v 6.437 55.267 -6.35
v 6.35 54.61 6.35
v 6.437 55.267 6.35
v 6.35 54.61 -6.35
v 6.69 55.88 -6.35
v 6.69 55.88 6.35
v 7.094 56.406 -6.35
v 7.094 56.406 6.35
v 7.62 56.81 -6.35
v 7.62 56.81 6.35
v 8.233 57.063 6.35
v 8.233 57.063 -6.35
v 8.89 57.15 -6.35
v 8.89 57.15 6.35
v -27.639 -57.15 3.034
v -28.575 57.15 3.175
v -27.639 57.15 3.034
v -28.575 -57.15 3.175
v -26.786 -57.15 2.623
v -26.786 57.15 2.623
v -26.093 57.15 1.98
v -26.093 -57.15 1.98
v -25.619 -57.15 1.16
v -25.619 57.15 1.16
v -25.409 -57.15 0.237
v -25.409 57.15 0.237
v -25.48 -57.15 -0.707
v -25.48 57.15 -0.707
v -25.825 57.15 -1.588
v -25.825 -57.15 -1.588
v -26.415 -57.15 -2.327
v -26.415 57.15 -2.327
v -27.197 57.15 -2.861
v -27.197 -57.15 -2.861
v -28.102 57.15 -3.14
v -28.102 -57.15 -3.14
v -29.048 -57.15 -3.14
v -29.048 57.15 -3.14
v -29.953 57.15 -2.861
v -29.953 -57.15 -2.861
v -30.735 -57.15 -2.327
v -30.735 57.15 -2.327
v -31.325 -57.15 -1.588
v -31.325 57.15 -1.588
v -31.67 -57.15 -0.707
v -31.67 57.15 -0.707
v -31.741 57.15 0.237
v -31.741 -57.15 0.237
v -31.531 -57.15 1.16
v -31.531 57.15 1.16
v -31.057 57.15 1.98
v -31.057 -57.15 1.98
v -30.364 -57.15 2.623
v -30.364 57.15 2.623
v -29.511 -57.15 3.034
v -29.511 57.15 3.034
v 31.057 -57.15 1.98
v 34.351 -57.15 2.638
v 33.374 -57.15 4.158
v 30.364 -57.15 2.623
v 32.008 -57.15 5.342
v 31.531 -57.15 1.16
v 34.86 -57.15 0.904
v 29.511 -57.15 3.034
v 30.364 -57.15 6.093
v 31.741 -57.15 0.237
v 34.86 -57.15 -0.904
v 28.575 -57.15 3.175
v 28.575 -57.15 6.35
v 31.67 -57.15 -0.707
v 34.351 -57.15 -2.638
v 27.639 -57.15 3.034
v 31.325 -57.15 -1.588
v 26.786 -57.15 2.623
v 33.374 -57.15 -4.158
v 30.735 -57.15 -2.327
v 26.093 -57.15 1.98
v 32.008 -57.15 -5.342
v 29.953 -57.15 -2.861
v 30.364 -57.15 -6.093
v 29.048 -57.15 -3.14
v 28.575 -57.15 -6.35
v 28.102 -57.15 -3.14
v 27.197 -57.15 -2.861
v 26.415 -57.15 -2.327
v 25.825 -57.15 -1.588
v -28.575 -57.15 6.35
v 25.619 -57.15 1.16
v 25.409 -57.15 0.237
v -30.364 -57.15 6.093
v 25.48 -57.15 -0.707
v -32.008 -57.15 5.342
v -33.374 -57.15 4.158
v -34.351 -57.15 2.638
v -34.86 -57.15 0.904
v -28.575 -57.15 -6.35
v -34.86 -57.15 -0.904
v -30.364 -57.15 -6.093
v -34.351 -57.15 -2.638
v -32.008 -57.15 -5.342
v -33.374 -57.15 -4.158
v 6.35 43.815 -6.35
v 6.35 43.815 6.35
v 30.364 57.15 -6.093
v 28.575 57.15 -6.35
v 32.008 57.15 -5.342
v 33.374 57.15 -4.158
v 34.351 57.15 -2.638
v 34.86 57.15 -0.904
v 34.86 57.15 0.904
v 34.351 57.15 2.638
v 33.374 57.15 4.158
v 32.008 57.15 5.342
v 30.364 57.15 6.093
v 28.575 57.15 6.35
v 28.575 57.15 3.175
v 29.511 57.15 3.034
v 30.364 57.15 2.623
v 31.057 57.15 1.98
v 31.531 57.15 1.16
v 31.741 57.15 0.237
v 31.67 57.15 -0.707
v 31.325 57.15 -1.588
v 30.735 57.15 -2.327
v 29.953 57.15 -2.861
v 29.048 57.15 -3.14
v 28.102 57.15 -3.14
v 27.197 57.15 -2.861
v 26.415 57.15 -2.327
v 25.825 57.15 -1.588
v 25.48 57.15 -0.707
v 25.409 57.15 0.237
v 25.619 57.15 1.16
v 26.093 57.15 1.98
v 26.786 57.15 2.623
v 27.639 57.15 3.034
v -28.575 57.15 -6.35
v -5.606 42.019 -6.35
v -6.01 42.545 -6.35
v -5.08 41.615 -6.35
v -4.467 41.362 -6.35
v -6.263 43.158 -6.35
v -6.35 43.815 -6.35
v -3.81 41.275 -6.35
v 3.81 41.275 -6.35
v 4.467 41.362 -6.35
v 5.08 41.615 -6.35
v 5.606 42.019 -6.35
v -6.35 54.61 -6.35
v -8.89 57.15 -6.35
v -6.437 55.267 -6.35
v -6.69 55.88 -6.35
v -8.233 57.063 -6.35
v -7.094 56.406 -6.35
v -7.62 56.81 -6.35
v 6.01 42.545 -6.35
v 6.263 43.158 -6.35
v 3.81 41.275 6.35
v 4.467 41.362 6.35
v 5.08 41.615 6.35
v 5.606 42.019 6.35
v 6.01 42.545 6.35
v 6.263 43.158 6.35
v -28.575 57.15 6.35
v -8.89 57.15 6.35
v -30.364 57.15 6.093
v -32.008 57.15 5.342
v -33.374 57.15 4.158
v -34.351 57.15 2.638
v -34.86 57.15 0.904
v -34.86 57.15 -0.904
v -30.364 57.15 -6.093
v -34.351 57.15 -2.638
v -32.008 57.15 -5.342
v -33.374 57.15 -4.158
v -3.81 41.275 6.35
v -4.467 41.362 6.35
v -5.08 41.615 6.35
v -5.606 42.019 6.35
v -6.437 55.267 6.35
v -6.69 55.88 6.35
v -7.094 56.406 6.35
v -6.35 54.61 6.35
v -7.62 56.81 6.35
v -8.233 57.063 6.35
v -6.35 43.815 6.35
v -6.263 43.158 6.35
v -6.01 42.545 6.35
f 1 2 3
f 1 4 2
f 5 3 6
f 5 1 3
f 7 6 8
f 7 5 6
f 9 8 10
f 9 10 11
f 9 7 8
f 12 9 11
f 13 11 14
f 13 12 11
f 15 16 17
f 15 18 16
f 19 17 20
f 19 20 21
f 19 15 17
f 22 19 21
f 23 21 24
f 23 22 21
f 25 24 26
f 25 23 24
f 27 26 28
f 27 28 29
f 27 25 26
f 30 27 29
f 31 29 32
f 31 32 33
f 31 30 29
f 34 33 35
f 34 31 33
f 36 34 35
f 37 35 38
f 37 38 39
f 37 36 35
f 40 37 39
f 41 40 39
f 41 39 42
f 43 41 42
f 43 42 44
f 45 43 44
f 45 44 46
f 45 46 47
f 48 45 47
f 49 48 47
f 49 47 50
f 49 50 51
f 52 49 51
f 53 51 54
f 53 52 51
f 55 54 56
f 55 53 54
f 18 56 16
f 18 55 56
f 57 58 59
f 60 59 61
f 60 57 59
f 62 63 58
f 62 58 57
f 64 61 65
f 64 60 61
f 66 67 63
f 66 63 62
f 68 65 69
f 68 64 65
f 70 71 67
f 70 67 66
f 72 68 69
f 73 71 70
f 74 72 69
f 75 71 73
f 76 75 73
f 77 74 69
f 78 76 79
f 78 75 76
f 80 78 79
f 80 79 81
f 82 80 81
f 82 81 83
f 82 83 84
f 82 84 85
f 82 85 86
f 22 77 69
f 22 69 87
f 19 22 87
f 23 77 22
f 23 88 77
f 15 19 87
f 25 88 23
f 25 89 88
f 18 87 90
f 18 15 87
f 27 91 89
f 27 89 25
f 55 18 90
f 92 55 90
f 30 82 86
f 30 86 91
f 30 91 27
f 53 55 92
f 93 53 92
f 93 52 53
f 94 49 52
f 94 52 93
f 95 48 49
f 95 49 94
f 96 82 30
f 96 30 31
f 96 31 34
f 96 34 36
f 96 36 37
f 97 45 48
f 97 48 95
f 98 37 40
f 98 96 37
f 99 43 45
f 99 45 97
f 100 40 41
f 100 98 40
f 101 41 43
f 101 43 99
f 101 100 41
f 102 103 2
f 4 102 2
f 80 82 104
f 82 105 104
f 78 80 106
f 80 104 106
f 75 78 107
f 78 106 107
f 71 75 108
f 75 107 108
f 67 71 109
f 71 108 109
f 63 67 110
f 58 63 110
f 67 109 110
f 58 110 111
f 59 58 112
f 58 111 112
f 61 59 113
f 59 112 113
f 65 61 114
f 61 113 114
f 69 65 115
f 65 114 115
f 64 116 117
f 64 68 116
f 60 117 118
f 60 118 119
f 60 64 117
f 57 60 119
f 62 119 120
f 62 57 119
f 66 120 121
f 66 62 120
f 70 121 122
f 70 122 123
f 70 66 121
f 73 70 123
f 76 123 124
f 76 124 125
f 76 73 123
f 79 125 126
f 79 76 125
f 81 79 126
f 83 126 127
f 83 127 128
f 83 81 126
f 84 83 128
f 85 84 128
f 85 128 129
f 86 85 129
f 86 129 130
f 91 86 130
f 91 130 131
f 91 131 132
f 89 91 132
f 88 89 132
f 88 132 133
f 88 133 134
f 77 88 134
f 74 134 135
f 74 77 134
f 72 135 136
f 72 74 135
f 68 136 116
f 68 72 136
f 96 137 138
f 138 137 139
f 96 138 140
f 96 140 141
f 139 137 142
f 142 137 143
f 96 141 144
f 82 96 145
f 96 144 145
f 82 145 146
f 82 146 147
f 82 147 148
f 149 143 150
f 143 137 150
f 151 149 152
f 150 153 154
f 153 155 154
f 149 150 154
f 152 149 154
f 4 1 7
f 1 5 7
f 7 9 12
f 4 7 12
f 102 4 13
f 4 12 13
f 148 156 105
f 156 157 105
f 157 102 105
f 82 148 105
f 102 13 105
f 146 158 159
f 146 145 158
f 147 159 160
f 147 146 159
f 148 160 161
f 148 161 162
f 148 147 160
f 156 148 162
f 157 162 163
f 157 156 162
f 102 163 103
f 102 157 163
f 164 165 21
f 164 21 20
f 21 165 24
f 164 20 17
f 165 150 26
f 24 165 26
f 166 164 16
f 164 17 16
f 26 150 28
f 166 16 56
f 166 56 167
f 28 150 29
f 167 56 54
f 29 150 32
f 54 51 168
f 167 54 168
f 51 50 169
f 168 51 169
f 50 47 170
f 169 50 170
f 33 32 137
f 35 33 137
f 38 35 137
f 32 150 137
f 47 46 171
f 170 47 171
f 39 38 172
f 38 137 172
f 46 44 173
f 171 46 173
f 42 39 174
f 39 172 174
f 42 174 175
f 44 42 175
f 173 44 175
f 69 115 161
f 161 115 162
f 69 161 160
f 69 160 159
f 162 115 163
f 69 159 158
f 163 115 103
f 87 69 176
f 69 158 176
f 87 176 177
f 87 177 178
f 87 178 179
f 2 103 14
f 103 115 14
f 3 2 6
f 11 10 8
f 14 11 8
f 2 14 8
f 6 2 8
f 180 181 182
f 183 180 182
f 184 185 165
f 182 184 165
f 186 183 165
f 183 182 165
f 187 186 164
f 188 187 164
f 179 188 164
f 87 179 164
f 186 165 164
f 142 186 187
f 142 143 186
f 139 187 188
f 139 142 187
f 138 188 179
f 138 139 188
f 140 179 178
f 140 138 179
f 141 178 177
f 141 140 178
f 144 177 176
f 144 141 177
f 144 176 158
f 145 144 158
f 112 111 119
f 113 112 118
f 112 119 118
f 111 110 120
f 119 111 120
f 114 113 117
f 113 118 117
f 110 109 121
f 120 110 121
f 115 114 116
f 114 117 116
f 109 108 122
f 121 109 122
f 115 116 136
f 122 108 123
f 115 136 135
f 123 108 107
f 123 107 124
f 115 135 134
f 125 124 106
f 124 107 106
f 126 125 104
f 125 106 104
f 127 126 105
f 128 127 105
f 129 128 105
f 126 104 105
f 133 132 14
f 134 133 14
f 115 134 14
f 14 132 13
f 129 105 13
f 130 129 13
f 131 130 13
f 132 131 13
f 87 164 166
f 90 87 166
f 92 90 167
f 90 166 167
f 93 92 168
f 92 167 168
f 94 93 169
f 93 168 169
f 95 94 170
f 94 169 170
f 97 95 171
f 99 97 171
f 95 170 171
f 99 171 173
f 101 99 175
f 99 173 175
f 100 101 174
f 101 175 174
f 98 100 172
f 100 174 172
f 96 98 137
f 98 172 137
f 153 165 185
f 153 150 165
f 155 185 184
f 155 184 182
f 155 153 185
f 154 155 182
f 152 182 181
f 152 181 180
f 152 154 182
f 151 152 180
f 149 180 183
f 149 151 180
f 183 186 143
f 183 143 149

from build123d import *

# Parameters (mm, degrees)
SKETCH2_R           = 3.175
BOSS_EXTRUDE1_DEPTH = 57.15
SKETCH7_W           = 12.7
SKETCH7_H           = 15.875
CUT_EXTRUDE3_DEPTH  = 69.170141008
FILLET1_R           = 2.54


with BuildPart() as part:
    # Sketch2 → Boss-Extrude1 (new, symmetric)
    with BuildSketch(Plane(origin=(0, 0, 0), x_dir=(1, 0, 0), z_dir=(0, 1, 0))):
        with BuildLine():
            Line((-28.575, 6.35), (28.575, 6.35))
            ThreePointArc((28.575, 6.35), (34.925, 0), (28.575, -6.35))
            Line((28.575, -6.35), (-28.575, -6.35))
            ThreePointArc((-28.575, -6.35), (-34.925, 0), (-28.575, 6.35))
        make_face()
        with Locations(Location((28.575, 0, 0), (0, 0, 270))):
            Circle(SKETCH2_R, mode=Mode.SUBTRACT)
        with Locations(Location((-28.575, 0, 0), (0, 0, 270))):
            Circle(SKETCH2_R, mode=Mode.SUBTRACT)
    extrude(amount=BOSS_EXTRUDE1_DEPTH, both=True)

    # Sketch7 → Cut-Extrude3 (cut, through all)
    with BuildSketch(Plane.XY.offset(6.35)):
        with Locations((0, 49.2125)):
            Rectangle(SKETCH7_W, SKETCH7_H)
    extrude(amount=-CUT_EXTRUDE3_DEPTH, mode=Mode.SUBTRACT)

    # Fillet1
    fillet1_edges = [part.edges().sort_by_distance(p)[0] for p in [
        (-6.35, 57.15, 0),
        (6.35, 57.15, 0),
        (6.35, 41.275, 0),
        (-6.35, 41.275, 0),
    ]]
    fillet(fillet1_edges, radius=FILLET1_R)


solid = part.part
